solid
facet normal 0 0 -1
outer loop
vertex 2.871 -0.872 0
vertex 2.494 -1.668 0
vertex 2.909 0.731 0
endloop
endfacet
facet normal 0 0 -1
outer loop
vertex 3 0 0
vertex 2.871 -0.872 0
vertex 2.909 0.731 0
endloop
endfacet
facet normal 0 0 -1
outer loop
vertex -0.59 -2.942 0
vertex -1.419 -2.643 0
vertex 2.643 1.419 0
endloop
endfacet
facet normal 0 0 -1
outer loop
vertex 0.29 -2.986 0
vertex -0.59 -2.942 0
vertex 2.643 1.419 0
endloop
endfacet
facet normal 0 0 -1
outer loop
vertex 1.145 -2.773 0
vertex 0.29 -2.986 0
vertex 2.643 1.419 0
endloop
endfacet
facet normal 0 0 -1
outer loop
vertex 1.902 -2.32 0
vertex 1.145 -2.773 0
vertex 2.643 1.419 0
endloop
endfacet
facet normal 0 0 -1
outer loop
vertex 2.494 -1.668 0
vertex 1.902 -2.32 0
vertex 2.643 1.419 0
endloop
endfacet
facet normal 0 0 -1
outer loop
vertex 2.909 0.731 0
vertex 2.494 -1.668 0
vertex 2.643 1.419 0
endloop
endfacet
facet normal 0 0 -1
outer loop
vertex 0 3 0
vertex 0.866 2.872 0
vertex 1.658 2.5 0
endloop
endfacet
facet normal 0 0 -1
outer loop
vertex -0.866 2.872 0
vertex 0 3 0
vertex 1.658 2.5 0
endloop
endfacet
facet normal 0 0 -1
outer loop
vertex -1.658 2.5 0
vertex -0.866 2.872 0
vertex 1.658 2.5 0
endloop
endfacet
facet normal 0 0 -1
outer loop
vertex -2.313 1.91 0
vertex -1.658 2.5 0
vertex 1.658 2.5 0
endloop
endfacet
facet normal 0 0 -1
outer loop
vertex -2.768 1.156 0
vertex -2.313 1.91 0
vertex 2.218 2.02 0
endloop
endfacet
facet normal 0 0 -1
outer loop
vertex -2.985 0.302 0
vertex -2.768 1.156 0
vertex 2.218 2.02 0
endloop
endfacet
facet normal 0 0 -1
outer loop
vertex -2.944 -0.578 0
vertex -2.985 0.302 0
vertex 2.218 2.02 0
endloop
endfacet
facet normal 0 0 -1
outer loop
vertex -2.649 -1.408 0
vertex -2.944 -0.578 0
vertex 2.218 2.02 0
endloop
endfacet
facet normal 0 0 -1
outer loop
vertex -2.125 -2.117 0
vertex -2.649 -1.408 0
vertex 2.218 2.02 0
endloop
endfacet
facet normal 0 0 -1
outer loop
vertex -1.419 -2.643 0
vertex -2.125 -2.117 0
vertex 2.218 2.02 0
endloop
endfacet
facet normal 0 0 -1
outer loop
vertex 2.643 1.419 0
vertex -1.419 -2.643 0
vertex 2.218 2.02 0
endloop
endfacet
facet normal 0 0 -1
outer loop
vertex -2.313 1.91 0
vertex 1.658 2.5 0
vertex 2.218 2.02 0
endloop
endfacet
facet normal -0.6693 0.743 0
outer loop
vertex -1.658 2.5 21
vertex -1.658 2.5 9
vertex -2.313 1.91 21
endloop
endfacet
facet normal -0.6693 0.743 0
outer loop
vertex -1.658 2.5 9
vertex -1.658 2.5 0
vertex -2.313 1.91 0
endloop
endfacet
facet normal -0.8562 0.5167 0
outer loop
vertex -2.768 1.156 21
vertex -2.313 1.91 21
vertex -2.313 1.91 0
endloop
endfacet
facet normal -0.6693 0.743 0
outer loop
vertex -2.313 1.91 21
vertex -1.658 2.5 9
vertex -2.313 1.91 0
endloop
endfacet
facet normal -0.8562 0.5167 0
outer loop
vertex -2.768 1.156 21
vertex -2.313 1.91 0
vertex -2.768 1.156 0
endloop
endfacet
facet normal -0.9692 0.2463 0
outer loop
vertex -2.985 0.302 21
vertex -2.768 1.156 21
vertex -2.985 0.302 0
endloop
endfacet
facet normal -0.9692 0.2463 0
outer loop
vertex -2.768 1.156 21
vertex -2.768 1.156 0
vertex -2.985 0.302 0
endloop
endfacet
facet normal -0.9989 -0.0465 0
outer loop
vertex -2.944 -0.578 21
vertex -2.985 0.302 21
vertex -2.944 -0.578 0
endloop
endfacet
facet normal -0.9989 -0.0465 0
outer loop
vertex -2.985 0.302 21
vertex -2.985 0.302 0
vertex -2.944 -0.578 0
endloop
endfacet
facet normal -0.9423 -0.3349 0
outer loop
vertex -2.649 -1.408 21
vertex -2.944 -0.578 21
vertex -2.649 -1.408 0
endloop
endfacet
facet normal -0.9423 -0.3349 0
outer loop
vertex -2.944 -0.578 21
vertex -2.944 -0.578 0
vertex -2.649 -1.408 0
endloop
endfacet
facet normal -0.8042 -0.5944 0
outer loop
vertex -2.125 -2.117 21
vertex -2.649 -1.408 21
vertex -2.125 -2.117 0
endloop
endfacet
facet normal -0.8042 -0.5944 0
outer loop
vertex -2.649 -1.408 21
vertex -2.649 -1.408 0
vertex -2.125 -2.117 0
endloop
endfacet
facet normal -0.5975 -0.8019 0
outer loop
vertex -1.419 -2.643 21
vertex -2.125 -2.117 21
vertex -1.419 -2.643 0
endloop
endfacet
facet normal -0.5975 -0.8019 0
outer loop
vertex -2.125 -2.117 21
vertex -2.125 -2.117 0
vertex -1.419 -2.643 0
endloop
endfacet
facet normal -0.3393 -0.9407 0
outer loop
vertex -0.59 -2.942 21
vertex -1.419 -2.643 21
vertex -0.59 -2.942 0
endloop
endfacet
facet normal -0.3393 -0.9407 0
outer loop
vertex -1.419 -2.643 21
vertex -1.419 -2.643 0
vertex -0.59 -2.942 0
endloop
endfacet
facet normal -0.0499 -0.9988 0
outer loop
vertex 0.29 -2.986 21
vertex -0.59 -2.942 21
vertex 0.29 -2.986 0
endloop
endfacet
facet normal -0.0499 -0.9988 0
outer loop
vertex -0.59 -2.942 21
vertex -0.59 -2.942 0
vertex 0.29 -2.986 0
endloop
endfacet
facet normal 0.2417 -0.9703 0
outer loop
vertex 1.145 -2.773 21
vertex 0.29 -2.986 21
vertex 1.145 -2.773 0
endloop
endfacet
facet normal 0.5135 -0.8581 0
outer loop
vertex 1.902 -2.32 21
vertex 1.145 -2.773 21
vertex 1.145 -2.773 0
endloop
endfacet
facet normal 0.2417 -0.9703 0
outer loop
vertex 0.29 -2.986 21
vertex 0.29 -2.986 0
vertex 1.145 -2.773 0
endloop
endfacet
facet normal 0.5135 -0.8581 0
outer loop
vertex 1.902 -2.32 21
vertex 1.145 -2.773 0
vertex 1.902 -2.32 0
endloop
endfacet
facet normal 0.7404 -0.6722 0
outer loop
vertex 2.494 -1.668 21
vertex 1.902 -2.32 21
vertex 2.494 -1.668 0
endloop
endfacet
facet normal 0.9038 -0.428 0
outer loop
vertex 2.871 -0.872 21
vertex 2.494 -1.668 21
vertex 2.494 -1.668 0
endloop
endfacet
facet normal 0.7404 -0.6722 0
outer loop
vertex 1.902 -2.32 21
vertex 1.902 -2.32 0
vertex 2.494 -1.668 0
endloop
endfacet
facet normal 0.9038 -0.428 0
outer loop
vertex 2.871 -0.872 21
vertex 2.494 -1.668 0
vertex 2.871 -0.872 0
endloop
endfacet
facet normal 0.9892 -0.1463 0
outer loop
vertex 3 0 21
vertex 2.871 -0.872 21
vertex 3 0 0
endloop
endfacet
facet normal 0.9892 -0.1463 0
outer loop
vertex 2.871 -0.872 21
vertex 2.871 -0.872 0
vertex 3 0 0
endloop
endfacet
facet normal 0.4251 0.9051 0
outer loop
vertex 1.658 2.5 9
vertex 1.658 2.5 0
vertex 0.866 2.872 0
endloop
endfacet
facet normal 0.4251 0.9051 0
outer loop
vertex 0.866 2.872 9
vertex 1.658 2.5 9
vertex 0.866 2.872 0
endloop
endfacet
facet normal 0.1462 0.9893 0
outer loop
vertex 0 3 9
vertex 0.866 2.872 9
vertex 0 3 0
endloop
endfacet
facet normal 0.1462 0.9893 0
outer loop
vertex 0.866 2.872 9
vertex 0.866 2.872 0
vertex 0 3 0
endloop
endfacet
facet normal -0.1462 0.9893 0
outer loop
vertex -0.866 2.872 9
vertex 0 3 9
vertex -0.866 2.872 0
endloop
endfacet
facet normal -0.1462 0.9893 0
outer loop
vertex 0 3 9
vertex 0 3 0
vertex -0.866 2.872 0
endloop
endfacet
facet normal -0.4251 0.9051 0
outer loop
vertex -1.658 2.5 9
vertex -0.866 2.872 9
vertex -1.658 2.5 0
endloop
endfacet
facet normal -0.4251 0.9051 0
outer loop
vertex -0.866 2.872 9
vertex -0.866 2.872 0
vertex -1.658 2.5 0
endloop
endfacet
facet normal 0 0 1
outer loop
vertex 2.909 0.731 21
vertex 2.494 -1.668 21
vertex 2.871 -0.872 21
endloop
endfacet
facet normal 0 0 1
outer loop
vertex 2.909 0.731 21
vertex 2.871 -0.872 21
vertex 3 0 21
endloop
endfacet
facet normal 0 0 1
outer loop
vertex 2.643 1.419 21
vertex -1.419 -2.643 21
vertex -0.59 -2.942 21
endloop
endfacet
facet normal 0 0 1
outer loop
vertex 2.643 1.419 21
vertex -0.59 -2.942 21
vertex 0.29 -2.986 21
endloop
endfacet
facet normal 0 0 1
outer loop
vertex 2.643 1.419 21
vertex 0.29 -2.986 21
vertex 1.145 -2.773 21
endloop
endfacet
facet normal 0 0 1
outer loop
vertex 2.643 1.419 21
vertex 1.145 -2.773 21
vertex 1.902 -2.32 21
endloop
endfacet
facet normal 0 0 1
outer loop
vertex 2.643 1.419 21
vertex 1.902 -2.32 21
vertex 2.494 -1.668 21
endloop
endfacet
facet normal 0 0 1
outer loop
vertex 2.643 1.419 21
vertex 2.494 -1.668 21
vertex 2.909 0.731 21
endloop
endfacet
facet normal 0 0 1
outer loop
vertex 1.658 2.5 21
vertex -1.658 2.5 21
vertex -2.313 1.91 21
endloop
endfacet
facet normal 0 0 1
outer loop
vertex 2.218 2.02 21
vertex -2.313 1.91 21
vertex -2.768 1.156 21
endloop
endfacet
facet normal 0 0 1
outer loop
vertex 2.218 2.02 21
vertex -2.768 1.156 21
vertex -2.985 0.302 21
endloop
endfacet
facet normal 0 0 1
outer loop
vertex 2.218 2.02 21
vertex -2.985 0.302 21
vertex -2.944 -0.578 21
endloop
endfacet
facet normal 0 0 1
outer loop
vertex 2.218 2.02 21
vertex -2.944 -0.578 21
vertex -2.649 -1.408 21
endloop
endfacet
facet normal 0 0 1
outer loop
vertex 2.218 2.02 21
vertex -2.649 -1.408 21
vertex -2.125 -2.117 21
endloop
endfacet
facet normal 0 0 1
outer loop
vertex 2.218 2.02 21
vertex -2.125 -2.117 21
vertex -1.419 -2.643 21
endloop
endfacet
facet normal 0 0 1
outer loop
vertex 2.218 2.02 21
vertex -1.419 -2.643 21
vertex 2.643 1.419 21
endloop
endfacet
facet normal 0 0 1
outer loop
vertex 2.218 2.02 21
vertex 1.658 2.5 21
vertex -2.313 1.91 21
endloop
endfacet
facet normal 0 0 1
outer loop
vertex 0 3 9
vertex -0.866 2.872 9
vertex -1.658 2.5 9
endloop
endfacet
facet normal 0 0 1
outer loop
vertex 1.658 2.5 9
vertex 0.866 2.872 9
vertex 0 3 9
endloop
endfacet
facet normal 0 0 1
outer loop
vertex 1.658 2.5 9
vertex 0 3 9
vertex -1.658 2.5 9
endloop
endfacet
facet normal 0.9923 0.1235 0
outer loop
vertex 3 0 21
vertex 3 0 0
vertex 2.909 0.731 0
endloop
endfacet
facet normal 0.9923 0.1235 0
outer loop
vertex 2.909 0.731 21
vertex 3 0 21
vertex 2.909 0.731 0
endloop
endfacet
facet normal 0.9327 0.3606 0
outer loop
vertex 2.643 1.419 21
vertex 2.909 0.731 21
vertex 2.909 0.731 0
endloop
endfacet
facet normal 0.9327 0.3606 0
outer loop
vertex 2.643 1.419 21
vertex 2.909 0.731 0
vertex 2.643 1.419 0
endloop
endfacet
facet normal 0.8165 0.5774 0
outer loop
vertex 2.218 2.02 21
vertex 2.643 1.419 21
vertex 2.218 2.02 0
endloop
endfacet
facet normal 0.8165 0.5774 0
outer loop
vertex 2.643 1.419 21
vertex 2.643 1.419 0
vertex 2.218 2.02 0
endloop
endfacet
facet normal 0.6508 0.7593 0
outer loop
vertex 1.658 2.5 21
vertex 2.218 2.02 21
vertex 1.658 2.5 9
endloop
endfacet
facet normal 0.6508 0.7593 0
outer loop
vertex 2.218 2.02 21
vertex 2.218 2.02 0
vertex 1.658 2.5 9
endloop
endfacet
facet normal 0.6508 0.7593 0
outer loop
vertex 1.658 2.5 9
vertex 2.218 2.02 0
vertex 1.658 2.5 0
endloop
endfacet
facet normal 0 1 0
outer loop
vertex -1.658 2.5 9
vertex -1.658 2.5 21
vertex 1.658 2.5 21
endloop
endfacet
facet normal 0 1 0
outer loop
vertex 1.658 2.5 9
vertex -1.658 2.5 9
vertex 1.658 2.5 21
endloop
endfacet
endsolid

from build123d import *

# Parameters (mm, degrees)
BOSS_EXTRUDE1_DEPTH = 21
CUT_EXTRUDE1_START  = 21
CUT_EXTRUDE1_DEPTH  = 12


with BuildPart() as part:
    # Sketch1 → Boss-Extrude1 (new body)
    with BuildSketch(Plane.XY):
        with BuildLine():
            ThreePointArc((1.658312395, 2.5), (0, 3), (-1.658312395, 2.5))
            Line((-1.658312395, 2.5), (1.658312395, 2.5))
        make_face()
        with BuildLine():
            Line((1.658312395, 2.5), (-1.658312395, 2.5))
            ThreePointArc((-1.658312395, 2.5), (-1.418637165, -2.643382037), (3, 0))
            ThreePointArc((3, 0), (2.643382037, 1.418637165), (1.658312395, 2.5))
        make_face()
    extrude(amount=BOSS_EXTRUDE1_DEPTH)

    # Sketch1<3> → Cut-Extrude1 (cut)
    with BuildSketch(Plane.XY.offset(CUT_EXTRUDE1_START)):
        Polygon((-26.073564647, 2.5), (-1.658312395, 2.5), (1.658312395, 2.5), (26.073564647, 2.5), (26.073564647, 51.330504504), (-26.073564647, 51.330504504), align=None)
    extrude(amount=-CUT_EXTRUDE1_DEPTH, mode=Mode.SUBTRACT)


solid = part.part
